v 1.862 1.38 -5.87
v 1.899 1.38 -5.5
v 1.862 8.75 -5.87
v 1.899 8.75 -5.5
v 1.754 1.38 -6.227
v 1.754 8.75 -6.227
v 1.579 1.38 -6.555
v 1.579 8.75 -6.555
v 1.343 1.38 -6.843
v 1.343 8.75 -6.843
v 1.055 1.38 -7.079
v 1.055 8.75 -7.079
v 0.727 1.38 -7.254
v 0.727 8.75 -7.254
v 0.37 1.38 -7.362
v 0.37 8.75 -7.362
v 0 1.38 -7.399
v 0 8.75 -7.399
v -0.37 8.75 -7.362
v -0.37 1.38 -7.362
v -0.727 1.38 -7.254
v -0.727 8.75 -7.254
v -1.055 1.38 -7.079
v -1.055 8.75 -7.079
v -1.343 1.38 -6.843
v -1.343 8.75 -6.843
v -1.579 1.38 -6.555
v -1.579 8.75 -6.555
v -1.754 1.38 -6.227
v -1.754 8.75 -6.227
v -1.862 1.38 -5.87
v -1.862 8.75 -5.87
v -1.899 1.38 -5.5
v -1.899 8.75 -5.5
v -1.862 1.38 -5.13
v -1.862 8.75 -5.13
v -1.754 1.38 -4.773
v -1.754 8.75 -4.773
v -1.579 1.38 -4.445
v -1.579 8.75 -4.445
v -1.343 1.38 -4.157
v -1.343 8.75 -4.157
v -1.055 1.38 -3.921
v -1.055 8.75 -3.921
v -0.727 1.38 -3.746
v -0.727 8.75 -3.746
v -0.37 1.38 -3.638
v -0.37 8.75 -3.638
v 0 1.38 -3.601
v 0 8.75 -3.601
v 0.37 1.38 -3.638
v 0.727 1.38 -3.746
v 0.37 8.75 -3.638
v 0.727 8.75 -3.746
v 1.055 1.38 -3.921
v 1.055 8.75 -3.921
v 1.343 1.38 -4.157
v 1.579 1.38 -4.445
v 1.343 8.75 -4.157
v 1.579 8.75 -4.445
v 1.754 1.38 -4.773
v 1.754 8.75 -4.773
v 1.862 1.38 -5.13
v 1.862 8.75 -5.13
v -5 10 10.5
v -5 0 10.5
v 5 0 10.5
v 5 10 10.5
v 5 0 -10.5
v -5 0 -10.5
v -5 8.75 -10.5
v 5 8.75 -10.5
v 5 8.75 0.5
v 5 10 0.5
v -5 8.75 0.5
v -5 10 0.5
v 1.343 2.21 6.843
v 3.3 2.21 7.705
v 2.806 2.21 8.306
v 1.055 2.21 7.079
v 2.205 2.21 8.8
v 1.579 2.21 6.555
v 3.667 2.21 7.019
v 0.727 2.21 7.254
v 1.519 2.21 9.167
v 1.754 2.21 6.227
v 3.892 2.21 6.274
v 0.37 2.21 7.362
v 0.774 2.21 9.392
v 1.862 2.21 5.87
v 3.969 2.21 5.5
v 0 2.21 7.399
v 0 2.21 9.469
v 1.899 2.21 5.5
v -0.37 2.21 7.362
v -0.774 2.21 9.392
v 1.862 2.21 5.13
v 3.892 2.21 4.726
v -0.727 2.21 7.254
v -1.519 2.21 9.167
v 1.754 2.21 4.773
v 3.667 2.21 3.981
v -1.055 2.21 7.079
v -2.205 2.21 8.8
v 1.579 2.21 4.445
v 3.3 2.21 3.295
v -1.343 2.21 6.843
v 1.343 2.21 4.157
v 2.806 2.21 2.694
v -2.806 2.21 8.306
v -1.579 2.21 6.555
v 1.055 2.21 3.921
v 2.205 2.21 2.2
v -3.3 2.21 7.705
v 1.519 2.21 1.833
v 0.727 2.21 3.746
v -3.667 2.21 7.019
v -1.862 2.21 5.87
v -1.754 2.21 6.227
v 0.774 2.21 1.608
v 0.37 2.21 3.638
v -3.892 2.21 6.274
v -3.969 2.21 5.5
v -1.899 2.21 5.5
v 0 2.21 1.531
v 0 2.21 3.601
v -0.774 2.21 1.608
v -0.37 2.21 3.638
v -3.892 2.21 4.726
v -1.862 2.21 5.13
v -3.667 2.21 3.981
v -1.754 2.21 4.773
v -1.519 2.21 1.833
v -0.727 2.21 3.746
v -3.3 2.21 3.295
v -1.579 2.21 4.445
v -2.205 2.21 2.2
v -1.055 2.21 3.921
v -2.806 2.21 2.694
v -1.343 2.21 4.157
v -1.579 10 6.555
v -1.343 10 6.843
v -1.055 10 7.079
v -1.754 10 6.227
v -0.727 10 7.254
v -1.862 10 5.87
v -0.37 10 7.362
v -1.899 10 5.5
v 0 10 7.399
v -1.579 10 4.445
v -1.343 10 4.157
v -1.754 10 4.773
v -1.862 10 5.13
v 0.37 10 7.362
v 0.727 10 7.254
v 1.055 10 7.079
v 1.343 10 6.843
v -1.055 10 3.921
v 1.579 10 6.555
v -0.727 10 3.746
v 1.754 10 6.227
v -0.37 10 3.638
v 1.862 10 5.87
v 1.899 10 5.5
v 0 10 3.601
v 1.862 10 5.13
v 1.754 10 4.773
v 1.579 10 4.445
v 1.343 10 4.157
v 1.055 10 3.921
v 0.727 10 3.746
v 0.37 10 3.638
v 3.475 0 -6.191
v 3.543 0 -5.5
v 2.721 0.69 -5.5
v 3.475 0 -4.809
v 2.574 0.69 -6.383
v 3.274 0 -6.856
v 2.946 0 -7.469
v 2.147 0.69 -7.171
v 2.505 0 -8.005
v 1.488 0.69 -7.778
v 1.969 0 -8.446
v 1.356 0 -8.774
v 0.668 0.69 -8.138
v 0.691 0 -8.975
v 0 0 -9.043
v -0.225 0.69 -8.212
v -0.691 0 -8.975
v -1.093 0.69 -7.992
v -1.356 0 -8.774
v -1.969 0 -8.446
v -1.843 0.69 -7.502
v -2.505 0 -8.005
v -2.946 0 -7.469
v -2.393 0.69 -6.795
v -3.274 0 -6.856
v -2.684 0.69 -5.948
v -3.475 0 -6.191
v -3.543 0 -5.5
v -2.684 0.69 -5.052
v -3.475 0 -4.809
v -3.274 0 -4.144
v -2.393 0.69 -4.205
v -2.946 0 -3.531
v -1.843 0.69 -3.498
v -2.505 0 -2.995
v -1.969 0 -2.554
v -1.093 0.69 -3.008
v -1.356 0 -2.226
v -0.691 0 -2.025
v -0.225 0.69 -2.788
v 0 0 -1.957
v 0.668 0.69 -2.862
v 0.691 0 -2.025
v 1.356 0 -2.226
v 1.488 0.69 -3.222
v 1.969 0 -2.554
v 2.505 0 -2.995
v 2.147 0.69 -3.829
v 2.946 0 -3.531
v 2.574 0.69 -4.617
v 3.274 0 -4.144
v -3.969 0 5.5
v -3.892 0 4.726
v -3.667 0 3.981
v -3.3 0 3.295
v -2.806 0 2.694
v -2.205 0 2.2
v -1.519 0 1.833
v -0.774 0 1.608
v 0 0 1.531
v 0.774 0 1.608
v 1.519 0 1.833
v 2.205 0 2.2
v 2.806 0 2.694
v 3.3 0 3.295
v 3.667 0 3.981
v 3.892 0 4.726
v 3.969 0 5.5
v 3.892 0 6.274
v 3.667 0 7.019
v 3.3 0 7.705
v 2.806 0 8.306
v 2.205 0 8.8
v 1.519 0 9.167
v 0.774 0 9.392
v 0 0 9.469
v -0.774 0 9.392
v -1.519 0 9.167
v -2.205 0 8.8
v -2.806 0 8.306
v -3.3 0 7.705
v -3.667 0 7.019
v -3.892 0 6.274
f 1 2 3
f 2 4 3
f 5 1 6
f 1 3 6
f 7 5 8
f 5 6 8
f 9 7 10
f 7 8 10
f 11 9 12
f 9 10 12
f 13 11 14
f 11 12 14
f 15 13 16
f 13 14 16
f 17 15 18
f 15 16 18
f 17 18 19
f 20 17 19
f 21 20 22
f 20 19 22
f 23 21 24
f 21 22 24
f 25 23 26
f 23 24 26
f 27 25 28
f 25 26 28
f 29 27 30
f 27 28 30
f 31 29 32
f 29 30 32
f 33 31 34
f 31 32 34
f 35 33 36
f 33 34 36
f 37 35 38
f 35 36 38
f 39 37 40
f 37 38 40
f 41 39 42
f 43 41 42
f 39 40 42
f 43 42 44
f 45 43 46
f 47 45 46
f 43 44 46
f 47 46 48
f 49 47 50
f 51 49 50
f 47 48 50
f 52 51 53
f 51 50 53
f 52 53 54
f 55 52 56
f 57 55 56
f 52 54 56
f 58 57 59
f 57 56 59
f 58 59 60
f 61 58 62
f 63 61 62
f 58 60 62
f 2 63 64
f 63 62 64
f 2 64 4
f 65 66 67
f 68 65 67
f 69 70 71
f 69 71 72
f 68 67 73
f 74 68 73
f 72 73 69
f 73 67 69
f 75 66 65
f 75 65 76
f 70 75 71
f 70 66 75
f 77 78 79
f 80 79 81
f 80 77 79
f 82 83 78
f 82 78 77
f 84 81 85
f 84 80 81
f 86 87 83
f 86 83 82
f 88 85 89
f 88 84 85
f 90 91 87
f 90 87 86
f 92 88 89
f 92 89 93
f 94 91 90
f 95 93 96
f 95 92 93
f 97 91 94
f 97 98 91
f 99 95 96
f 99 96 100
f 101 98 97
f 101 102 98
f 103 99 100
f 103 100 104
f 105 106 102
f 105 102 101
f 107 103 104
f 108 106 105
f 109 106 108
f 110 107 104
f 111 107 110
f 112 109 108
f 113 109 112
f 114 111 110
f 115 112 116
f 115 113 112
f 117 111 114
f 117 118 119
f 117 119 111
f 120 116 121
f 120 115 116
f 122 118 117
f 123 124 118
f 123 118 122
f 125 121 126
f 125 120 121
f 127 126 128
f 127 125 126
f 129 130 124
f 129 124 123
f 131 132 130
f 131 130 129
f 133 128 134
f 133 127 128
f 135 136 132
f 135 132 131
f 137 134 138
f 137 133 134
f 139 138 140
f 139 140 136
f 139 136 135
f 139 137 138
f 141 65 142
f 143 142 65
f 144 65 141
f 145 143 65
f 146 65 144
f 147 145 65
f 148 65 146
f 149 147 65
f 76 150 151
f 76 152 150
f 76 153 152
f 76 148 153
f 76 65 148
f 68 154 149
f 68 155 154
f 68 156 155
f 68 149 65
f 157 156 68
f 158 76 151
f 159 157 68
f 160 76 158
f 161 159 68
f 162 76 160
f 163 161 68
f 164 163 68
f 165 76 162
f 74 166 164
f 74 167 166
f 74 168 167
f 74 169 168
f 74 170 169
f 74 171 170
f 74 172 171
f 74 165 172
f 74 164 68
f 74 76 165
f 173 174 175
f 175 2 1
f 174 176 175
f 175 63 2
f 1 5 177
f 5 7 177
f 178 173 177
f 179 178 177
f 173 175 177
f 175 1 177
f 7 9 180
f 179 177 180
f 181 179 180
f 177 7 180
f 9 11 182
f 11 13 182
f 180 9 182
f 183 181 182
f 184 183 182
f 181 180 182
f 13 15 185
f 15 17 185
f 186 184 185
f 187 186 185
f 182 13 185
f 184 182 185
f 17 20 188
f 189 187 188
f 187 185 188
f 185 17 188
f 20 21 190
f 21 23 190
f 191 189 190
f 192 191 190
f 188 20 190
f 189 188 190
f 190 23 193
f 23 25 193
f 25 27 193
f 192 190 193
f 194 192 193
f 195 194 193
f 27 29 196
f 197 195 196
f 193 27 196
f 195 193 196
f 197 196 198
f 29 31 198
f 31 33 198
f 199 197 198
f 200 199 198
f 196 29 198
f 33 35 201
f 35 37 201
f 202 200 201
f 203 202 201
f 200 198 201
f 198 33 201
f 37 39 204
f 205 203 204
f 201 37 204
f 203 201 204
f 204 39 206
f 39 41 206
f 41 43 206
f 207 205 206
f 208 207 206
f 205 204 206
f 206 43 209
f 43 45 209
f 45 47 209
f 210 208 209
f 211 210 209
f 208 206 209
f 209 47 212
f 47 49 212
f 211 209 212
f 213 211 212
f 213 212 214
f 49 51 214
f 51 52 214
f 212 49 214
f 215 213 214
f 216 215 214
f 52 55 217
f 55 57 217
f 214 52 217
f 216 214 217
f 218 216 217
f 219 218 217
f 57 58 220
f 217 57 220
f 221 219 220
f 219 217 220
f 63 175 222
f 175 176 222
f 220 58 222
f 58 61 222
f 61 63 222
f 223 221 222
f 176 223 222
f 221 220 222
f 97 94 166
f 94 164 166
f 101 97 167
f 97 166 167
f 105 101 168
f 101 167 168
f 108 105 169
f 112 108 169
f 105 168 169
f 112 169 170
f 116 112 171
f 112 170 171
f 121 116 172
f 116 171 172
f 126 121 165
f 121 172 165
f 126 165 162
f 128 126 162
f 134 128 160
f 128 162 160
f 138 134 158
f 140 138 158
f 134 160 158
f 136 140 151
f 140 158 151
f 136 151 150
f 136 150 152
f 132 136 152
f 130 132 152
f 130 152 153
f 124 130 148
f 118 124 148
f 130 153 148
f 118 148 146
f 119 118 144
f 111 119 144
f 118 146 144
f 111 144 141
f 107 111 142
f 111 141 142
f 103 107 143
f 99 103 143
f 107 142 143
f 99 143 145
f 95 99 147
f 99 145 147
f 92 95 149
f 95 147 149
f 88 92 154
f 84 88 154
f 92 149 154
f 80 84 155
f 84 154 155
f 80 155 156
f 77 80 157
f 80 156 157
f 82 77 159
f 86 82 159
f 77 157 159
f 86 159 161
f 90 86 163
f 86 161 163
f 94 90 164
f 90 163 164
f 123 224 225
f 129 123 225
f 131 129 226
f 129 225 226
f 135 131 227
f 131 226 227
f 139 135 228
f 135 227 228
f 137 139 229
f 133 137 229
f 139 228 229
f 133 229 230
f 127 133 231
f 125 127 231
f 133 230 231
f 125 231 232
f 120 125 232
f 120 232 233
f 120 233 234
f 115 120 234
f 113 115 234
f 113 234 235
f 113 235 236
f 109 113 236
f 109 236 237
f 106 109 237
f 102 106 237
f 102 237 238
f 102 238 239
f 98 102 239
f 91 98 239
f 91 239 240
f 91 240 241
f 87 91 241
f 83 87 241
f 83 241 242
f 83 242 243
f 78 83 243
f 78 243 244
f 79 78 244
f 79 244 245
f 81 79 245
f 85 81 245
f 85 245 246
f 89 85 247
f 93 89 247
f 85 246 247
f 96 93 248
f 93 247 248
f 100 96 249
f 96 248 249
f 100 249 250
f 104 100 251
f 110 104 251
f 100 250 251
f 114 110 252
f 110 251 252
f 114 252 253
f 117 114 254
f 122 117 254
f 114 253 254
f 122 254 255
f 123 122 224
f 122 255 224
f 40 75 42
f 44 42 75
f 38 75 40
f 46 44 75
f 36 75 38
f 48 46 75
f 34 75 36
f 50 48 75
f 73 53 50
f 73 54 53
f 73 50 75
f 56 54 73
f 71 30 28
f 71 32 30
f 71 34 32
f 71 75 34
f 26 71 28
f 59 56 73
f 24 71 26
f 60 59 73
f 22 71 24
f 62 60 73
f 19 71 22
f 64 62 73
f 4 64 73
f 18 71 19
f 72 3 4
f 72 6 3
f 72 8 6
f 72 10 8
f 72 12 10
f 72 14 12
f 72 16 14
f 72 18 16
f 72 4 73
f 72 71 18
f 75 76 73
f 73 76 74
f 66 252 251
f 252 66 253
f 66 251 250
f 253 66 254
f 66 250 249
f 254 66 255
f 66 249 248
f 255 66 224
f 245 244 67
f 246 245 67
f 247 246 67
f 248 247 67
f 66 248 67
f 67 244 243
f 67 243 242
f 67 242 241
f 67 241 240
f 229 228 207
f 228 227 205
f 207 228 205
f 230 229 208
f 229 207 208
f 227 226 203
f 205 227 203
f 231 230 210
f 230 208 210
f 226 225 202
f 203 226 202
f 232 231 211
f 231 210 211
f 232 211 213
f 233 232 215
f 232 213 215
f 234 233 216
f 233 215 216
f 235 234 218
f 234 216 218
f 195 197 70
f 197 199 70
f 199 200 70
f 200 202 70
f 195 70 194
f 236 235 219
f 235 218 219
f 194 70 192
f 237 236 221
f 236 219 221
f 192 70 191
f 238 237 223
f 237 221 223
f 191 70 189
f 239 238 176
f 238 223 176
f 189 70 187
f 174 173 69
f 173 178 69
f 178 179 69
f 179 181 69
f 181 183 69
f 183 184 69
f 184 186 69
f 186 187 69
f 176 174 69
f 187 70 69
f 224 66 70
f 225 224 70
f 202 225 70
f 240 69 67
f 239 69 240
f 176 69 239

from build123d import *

# Parameters (mm, degrees)
SKETCH1_W                                           = 10
SKETCH1_H                                           = 21
BOSS_EXTRUDE1_DEPTH                                 = 10
SKETCH2_W                                           = 10
SKETCH2_H                                           = 11
CUT_EXTRUDE1_DEPTH                                  = 1.25
CBORE_FOR_6_BINDING_HEAD_MACHINE_SCREW1_D           = 3.7973
CBORE_FOR_6_BINDING_HEAD_MACHINE_SCREW1_CBORE_D     = 7.9375
CBORE_FOR_6_BINDING_HEAD_MACHINE_SCREW1_CBORE_DEPTH = 2.2098
CSK_FOR_6_FLAT_HEAD_MACHINE_SCREW_100_D             = 3.7973
CSK_FOR_6_FLAT_HEAD_MACHINE_SCREW_100_CSINK_D       = 7.0866
CSK_FOR_6_FLAT_HEAD_MACHINE_SCREW_100_CSINK_ANGLE   = 100


with BuildPart() as part:
    # Sketch1 → Boss-Extrude1 (new body)
    with BuildSketch(Plane(origin=(0, 0, 0), x_dir=(1, 0, 0), z_dir=(0, 1, 0))):
        Rectangle(SKETCH1_W, SKETCH1_H)
    extrude(amount=BOSS_EXTRUDE1_DEPTH)

    # Sketch2 → Cut-Extrude1 (cut)
    with BuildSketch(Plane(origin=(0, 10, 0), x_dir=(1, 0, 0), z_dir=(0, 1, 0))):
        with Locations((0, 5)):
            Rectangle(SKETCH2_W, SKETCH2_H)
    extrude(amount=-CUT_EXTRUDE1_DEPTH, mode=Mode.SUBTRACT)

    # CBORE for #6 Binding Head Machine Screw1 (through all)
    with Locations(Plane(origin=(0, 0, 0), x_dir=(-1, 0, 0), z_dir=(0, -1, 0))):
        with Locations((0, -5.5)):
            CounterBoreHole(CBORE_FOR_6_BINDING_HEAD_MACHINE_SCREW1_D / 2, CBORE_FOR_6_BINDING_HEAD_MACHINE_SCREW1_CBORE_D / 2, CBORE_FOR_6_BINDING_HEAD_MACHINE_SCREW1_CBORE_DEPTH)

    # CSK for #6 Flat Head Machine Screw (100)1 (through all)
    with Locations(Plane(origin=(0, 0, 0), x_dir=(-1, 0, 0), z_dir=(0, -1, 0))):
        with Locations((0, 5.5)):
            CounterSinkHole(CSK_FOR_6_FLAT_HEAD_MACHINE_SCREW_100_D / 2, CSK_FOR_6_FLAT_HEAD_MACHINE_SCREW_100_CSINK_D / 2, counter_sink_angle=CSK_FOR_6_FLAT_HEAD_MACHINE_SCREW_100_CSINK_ANGLE)


solid = part.part
